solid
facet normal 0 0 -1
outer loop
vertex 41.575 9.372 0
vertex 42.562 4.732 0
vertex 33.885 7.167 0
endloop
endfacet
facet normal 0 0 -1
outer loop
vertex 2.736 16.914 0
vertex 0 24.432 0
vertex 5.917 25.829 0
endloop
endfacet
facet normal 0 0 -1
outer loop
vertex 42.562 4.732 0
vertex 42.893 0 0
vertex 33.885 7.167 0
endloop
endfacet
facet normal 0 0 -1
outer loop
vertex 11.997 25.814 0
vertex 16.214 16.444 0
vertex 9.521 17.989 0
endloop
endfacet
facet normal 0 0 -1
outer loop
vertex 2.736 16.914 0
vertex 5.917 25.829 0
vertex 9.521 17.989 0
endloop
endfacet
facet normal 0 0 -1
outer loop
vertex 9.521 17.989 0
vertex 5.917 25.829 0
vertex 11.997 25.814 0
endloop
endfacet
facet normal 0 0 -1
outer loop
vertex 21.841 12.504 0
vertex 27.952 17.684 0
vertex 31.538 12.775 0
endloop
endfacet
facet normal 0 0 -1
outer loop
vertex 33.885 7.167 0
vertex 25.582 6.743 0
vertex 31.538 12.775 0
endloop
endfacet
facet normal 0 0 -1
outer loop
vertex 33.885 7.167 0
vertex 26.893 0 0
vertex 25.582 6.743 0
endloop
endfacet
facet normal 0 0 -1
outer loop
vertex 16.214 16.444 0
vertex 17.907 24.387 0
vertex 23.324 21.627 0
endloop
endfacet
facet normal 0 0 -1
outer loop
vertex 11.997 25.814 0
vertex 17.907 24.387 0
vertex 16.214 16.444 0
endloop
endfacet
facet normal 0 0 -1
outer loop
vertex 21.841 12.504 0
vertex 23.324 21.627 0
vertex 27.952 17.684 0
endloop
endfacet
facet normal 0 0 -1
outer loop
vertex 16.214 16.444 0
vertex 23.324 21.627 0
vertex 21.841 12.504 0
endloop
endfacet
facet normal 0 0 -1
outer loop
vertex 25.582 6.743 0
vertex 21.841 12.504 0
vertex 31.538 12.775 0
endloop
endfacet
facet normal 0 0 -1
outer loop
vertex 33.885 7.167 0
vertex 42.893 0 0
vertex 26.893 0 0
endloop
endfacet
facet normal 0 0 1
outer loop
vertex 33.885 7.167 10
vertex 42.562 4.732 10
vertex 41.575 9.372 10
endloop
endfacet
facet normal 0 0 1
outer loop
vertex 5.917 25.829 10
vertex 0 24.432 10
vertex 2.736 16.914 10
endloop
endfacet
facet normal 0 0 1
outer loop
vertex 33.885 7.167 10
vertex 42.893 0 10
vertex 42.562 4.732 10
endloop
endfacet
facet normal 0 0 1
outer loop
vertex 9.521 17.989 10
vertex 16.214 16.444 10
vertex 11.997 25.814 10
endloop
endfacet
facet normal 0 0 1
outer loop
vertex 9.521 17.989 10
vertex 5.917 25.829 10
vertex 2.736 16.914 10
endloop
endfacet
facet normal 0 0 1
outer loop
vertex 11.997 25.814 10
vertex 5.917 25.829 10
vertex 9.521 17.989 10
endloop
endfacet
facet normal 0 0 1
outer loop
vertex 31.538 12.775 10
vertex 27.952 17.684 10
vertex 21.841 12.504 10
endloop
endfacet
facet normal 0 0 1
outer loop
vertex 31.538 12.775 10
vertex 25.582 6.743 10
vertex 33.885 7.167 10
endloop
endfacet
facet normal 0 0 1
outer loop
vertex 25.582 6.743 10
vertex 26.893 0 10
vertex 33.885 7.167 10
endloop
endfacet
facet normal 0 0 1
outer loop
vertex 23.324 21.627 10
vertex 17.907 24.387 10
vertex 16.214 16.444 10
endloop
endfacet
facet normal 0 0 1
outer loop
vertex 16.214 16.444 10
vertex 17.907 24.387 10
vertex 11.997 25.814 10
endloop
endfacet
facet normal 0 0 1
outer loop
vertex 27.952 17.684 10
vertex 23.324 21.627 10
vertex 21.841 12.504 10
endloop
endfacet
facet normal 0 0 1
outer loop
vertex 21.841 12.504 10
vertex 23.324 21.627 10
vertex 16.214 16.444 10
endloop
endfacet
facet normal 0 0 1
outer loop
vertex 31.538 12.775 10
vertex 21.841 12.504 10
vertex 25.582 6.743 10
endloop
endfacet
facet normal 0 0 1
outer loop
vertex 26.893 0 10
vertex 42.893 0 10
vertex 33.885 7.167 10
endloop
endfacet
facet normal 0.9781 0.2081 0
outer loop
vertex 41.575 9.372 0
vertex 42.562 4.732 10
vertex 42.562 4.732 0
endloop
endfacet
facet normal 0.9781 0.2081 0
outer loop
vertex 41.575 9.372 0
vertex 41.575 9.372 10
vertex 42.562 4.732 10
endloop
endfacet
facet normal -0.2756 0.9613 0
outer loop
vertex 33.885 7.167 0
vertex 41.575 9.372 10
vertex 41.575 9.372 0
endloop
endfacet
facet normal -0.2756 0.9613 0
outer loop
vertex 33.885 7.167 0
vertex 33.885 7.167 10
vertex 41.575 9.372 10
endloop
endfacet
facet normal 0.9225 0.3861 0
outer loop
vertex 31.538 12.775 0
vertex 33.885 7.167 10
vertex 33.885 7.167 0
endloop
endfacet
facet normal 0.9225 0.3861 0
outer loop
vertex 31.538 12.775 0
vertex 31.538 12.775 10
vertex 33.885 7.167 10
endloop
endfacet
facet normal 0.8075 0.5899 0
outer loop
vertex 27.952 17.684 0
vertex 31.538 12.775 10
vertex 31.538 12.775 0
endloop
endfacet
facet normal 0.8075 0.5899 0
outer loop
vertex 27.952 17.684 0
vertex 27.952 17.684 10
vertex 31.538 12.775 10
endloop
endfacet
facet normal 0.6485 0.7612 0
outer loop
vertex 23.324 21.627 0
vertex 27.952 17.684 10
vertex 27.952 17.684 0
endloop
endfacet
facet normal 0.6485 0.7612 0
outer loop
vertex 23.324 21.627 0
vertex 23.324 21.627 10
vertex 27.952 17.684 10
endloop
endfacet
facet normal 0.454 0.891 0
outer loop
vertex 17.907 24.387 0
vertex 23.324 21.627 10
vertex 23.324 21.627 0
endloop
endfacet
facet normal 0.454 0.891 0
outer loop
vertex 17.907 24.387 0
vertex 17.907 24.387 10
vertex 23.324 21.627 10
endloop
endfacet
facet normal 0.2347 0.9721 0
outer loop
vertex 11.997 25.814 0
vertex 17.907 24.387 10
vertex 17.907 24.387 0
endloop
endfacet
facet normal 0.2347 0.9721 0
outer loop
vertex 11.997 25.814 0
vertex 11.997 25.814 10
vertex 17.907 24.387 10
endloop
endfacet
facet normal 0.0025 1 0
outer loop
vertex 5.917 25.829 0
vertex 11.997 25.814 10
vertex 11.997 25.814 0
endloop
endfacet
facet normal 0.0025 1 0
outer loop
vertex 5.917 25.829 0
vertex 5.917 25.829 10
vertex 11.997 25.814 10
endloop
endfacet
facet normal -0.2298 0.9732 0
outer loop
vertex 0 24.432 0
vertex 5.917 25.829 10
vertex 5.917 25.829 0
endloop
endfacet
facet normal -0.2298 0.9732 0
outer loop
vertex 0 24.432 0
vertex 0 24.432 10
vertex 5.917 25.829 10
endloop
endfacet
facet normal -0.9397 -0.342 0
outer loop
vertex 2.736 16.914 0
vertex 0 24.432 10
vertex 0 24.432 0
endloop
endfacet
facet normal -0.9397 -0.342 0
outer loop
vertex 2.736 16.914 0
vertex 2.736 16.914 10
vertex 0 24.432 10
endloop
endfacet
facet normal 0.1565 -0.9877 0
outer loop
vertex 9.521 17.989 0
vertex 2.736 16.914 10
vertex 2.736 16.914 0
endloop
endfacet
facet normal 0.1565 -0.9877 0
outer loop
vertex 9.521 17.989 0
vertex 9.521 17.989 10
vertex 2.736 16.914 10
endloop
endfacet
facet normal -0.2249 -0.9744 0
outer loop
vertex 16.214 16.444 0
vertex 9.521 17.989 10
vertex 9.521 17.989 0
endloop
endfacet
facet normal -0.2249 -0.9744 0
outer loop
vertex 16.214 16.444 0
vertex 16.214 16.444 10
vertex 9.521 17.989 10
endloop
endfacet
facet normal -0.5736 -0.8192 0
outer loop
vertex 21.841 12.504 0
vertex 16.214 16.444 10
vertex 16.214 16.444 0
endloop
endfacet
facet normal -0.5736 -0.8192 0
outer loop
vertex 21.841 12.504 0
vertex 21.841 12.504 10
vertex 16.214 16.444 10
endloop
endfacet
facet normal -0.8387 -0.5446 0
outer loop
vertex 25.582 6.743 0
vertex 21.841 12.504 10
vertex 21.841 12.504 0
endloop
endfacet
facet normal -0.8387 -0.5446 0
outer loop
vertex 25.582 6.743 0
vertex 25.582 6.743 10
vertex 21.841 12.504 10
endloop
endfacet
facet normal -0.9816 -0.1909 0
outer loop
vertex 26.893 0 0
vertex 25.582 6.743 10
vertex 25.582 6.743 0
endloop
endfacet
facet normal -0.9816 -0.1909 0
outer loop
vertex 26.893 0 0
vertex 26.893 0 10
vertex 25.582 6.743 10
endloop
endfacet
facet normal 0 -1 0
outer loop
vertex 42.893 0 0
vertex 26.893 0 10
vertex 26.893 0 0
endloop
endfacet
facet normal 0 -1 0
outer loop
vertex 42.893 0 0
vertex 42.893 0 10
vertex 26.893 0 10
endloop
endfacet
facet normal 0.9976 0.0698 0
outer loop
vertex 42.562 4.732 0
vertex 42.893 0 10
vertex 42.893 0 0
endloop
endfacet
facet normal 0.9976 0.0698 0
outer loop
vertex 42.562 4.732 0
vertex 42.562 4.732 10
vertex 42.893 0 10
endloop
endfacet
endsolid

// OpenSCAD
$fn = 32;

// ----------------------------------------------------------------------
// Arc stop: segment, 10 mm thick
// ----------------------------------------------------------------------

// --- parameters (mm) ---
profile_height = 10;      // extrusion height
profile_points = 17;      // points of the closed outline

profile = [[42.893, 0], [42.562, 4.732], [41.575, 9.372], [33.885, 7.167], [31.538, 12.775], [27.952, 17.684], [23.324, 21.627], [17.907, 24.387], [11.997, 25.814], [5.917, 25.829], [0, 24.432], [2.736, 16.914], [9.521, 17.989], [16.214, 16.444], [21.841, 12.504], [25.582, 6.743], [26.893, 0]];  // single closed polygon, 17 points, counter clockwise

// --- the one profile operation ---
linear_extrude(height = profile_height) polygon(points = profile);
